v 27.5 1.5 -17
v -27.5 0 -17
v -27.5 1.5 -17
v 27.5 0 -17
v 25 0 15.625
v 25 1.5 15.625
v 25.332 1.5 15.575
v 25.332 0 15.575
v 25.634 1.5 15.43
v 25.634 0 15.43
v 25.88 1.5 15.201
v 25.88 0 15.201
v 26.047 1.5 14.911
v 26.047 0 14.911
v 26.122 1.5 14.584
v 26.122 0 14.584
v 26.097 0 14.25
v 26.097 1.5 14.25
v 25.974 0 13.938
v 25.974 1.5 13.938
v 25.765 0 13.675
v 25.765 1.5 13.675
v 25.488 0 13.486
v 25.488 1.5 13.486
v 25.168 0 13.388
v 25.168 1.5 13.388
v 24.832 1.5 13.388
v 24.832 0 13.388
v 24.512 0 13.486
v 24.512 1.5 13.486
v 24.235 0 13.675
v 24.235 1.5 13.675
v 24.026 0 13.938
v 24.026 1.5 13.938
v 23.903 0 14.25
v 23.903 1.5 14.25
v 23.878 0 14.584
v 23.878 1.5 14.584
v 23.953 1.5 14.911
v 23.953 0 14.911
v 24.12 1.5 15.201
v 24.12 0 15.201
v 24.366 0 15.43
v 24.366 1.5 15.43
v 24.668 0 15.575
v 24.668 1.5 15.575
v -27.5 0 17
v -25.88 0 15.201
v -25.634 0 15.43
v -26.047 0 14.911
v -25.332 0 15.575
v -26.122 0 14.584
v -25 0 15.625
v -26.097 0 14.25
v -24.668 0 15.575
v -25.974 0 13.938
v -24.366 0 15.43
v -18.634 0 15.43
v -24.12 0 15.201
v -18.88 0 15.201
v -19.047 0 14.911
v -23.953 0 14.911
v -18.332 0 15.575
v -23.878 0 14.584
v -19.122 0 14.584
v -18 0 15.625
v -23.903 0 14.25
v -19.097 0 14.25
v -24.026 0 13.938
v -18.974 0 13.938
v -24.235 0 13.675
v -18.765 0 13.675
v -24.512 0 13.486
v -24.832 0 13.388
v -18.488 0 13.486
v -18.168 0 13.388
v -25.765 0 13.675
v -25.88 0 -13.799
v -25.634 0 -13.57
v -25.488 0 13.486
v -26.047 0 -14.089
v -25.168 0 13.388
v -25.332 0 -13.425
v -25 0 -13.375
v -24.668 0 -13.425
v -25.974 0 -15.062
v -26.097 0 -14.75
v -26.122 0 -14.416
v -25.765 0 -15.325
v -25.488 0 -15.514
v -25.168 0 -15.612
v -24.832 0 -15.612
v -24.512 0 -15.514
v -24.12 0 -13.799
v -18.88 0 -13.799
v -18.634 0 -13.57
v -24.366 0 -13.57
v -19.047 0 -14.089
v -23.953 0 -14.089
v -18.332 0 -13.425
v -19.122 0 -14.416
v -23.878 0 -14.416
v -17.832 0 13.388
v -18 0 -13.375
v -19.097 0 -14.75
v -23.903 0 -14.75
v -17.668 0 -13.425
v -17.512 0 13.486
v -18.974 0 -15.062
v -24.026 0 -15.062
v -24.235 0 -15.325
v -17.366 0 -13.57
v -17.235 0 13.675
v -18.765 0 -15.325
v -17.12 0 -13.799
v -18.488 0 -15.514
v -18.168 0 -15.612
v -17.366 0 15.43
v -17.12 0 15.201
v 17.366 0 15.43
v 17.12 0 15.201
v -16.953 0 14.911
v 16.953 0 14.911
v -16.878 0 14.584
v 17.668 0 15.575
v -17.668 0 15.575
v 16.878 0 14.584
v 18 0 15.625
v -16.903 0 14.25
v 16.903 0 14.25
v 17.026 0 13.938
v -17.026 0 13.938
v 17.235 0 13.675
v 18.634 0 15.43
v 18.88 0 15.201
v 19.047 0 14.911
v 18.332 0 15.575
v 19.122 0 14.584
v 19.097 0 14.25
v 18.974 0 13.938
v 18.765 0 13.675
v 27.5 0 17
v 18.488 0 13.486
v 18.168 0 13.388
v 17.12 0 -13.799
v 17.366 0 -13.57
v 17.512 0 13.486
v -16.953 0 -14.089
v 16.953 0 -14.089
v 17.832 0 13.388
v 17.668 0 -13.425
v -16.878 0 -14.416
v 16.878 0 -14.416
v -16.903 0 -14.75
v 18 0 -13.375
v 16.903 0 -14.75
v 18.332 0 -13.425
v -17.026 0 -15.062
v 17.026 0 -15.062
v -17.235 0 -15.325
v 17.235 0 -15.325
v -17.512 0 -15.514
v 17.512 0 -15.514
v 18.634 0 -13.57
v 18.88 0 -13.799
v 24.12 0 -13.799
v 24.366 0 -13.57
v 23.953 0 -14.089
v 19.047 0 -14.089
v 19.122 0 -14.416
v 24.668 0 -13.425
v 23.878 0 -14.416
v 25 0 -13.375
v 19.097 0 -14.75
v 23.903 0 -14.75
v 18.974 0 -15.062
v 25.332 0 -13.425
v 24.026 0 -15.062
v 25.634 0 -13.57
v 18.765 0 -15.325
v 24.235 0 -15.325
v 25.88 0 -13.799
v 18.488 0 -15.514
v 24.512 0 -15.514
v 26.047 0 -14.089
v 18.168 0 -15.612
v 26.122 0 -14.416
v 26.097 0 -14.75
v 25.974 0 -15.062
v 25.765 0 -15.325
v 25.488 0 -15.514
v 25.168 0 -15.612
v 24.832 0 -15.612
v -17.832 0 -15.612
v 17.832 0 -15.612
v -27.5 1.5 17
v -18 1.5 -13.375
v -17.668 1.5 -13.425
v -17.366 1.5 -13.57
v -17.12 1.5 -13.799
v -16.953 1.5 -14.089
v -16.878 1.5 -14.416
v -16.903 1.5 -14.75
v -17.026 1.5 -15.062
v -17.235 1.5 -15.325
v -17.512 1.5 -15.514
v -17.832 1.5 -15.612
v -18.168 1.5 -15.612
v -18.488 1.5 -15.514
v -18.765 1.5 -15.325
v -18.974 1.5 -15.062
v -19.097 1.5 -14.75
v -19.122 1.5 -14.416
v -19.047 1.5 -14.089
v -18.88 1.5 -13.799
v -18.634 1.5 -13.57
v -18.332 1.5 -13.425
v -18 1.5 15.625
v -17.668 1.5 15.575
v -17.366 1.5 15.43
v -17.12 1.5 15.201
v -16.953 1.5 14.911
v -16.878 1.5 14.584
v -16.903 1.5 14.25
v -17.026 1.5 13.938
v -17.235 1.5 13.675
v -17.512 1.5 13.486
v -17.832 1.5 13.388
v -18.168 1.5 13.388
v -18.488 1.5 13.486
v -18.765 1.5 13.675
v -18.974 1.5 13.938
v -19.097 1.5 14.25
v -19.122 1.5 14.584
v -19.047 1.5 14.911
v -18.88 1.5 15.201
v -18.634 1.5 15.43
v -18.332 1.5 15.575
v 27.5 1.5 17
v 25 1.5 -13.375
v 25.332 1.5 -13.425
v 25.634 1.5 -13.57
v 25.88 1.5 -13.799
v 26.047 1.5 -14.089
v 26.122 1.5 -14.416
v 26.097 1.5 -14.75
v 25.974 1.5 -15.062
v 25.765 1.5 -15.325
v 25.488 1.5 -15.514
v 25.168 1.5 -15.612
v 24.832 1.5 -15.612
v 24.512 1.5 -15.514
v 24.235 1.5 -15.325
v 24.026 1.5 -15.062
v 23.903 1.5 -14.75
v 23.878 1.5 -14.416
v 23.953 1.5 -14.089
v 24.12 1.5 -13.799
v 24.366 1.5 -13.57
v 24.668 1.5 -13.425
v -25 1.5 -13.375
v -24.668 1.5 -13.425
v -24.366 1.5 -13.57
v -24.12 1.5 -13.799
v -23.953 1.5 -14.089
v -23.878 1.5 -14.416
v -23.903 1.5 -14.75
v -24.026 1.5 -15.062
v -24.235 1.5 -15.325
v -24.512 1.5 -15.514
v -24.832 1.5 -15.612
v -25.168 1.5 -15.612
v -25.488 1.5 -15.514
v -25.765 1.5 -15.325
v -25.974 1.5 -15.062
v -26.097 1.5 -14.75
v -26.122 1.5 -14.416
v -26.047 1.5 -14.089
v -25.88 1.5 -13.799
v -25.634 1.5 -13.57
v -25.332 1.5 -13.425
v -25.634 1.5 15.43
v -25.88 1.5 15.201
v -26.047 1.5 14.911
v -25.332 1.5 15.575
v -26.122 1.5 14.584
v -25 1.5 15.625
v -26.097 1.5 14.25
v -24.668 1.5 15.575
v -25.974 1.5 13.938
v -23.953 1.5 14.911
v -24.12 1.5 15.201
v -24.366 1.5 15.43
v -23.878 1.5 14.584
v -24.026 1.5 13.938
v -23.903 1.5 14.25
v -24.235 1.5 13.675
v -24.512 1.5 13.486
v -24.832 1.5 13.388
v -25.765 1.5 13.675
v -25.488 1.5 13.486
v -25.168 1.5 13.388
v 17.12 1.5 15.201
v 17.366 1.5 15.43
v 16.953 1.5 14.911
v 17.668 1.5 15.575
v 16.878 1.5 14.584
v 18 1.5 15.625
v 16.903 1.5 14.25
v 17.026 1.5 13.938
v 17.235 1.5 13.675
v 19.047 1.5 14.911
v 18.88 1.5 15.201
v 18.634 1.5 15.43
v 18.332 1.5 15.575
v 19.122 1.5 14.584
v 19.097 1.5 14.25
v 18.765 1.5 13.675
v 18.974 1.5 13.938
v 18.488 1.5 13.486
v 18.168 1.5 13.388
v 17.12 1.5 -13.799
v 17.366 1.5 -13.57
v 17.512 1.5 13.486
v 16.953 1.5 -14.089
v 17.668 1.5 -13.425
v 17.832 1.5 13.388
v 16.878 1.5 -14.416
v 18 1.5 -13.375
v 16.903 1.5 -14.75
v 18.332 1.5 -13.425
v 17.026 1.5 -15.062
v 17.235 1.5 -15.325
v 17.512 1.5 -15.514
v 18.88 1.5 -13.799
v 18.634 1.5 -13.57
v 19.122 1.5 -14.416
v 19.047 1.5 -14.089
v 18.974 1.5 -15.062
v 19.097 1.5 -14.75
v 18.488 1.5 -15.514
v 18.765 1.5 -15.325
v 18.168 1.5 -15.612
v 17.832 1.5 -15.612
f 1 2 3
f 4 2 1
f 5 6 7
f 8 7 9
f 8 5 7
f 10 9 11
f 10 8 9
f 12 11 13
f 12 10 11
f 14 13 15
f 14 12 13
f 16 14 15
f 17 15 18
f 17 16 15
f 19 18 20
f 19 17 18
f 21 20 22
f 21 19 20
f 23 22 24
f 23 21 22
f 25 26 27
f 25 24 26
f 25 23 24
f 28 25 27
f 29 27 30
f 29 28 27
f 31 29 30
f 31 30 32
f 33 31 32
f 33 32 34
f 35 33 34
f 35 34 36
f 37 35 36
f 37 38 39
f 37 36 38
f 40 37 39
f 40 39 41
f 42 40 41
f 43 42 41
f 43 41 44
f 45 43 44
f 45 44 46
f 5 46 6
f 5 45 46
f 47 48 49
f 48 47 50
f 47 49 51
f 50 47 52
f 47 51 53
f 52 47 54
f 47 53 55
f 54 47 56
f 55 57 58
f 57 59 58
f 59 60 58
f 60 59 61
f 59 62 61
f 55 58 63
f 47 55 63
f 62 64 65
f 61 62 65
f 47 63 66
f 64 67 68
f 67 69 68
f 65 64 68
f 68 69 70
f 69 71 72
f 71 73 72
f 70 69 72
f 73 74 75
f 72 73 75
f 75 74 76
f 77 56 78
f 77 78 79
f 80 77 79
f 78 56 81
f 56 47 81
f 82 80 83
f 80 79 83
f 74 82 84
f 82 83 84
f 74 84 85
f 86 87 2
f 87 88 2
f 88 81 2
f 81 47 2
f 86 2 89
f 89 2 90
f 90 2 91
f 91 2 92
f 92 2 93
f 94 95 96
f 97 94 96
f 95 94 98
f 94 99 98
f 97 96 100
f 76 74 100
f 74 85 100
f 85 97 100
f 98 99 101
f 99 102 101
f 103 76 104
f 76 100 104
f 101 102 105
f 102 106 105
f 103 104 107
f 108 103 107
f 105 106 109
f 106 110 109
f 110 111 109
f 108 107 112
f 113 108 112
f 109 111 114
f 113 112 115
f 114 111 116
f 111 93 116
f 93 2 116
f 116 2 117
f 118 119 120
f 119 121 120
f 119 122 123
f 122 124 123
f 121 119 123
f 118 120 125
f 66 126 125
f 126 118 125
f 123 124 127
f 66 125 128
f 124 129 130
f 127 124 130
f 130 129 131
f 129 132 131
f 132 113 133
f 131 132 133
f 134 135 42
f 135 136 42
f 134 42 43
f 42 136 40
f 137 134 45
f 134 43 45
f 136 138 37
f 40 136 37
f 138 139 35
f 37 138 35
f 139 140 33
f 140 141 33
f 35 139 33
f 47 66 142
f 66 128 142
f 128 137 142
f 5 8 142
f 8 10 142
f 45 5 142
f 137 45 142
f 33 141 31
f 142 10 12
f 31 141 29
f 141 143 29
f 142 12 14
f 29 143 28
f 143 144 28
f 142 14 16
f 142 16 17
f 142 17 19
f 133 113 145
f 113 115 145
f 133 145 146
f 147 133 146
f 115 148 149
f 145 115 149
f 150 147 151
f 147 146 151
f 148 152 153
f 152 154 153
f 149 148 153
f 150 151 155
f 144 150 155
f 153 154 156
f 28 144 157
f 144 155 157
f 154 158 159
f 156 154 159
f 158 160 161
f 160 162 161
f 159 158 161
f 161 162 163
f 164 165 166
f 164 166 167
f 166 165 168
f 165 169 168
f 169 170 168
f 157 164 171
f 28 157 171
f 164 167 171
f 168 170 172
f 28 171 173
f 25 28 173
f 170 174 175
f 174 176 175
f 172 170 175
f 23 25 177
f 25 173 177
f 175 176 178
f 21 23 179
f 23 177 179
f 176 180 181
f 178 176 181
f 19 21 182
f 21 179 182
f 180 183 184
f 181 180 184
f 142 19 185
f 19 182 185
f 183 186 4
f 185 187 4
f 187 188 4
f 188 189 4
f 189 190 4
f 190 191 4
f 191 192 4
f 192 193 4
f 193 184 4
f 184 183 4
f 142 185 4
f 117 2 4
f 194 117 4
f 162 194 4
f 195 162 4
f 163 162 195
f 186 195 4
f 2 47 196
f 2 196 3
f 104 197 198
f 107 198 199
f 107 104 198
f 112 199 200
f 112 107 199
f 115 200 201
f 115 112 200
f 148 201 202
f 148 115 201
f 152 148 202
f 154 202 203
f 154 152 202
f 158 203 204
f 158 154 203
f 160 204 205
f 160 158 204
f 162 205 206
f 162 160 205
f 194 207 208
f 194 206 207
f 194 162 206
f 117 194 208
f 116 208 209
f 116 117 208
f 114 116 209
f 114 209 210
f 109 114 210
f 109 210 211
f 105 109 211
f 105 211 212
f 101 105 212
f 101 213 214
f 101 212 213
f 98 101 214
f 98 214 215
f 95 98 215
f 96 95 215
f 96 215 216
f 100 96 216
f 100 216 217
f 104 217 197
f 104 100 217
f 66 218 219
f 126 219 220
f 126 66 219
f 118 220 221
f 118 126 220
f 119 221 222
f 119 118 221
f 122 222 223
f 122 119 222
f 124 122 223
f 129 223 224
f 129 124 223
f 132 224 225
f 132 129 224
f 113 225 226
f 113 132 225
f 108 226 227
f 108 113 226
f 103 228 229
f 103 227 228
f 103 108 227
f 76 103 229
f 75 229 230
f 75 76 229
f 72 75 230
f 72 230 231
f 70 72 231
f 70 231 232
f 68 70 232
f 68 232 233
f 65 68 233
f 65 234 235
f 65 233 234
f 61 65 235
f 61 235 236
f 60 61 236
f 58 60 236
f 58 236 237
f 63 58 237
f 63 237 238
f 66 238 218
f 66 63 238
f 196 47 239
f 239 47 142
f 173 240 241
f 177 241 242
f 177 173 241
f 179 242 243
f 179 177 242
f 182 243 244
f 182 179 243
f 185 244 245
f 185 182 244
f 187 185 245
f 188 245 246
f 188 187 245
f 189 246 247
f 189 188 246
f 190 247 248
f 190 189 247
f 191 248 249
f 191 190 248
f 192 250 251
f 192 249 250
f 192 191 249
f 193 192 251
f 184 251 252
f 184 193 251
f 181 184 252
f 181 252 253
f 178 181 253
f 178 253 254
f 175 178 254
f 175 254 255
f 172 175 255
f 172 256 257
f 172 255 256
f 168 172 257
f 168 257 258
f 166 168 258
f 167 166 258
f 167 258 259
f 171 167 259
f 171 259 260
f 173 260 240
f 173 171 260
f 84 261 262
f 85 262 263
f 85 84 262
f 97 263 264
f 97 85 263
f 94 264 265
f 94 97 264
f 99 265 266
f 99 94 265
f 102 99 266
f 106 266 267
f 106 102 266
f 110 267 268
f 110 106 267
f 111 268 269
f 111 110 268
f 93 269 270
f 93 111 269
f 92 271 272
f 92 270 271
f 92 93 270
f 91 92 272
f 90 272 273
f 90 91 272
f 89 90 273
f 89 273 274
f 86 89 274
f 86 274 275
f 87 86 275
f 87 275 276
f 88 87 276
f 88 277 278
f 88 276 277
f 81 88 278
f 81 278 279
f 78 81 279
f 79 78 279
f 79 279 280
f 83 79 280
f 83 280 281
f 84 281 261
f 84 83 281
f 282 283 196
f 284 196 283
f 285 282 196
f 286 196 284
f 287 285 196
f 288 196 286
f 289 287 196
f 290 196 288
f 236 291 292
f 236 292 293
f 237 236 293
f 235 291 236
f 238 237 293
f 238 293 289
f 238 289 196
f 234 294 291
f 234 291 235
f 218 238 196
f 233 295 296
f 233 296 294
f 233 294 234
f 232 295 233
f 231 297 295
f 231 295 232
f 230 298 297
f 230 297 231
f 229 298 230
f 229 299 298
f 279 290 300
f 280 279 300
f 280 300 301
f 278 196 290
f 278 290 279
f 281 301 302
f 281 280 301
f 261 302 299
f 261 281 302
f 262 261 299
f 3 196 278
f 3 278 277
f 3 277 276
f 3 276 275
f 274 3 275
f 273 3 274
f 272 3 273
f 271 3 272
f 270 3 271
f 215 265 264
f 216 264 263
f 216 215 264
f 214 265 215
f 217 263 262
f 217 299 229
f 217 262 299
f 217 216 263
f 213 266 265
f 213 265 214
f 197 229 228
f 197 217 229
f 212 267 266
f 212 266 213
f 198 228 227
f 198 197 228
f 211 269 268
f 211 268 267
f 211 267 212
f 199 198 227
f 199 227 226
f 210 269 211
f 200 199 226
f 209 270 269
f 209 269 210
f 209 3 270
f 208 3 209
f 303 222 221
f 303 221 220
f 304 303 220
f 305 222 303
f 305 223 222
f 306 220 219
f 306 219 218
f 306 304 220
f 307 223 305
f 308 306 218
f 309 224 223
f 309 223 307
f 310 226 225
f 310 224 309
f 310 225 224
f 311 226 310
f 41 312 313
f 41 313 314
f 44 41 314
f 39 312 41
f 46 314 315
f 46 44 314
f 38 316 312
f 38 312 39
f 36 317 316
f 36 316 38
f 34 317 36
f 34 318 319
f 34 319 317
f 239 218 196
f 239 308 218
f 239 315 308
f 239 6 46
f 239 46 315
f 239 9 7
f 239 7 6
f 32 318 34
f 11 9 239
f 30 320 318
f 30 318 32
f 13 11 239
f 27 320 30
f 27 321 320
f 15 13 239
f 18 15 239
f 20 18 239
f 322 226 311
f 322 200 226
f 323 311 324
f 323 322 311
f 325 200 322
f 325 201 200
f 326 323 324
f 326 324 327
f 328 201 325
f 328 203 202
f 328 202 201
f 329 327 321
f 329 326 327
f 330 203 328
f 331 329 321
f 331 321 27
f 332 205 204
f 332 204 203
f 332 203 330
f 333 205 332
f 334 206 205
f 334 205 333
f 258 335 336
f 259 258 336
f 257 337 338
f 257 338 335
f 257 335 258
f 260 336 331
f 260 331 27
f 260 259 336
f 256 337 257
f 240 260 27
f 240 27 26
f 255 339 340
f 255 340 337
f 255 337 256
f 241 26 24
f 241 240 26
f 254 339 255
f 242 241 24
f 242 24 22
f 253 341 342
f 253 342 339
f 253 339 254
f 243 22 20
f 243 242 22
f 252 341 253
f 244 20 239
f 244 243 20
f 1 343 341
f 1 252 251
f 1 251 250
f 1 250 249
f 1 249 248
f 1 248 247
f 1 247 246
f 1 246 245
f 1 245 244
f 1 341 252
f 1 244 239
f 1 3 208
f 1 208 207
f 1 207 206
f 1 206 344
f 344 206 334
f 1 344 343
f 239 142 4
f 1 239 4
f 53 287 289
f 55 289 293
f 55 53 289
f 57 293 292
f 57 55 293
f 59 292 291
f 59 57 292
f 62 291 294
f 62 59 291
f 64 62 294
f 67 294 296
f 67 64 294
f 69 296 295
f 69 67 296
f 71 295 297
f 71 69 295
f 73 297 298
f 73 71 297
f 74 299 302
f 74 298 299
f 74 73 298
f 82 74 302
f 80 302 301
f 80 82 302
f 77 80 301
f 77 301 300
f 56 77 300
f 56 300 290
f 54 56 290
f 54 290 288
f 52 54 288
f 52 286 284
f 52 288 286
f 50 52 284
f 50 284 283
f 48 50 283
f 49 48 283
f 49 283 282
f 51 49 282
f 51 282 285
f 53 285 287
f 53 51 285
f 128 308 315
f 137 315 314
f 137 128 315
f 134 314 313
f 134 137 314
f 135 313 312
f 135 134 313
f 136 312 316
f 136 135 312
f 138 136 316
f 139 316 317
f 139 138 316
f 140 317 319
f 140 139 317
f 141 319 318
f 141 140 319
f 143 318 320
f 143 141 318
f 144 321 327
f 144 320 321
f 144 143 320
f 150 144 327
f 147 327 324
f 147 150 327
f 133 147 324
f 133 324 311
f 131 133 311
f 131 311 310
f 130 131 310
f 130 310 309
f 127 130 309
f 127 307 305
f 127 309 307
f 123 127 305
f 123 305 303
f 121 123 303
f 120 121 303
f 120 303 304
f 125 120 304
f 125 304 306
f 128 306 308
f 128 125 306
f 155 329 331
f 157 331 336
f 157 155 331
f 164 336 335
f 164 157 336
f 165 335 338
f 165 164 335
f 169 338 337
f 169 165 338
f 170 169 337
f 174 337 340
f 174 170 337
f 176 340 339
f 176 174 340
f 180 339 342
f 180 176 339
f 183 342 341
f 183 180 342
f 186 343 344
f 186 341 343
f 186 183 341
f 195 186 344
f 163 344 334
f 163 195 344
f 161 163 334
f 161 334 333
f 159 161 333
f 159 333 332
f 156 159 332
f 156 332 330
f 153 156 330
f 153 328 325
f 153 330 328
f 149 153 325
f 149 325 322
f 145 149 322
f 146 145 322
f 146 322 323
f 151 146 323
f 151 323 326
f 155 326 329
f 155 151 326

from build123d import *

# Parameters (mm, degrees)
SKETCH1_W           = 55
SKETCH1_H           = 34
BOSS_EXTRUDE1_DEPTH = 1.5
SKETCH3_R           = 1.125
CUT_EXTRUDE5_DEPTH  = 33.365104665


with BuildPart() as part:
    # Sketch1 → Boss-Extrude1 (new body)
    with BuildSketch(Plane(origin=(0, 0, 0), x_dir=(1, 0, 0), z_dir=(0, 1, 0))):
        Rectangle(SKETCH1_W, SKETCH1_H)
    extrude(amount=BOSS_EXTRUDE1_DEPTH)

    # Sketch3 → Cut-Extrude5 (cut, through all)
    with BuildSketch(Plane(origin=(0, 0, 0), x_dir=(1, 0, 0), z_dir=(0, 1, 0))):
        with Locations(Location((-18, 14.5, 0), (0, 0, 270))):
            Circle(SKETCH3_R)
        with Locations(Location((18, 14.5, 0), (0, 0, 270))):
            Circle(SKETCH3_R)
        with Locations(Location((-18, -14.5, 0), (0, 0, 270))):
            Circle(SKETCH3_R)
        with Locations(Location((18, -14.5, 0), (0, 0, 270))):
            Circle(SKETCH3_R)
        with Locations(Location((-25, 14.5, 0), (0, 0, 270))):
            Circle(SKETCH3_R)
        with Locations(Location((25, 14.5, 0), (0, 0, 270))):
            Circle(SKETCH3_R)
        with Locations(Location((25, -14.5, 0), (0, 0, 270))):
            Circle(SKETCH3_R)
        with Locations(Location((-25, -14.5, 0), (0, 0, 270))):
            Circle(SKETCH3_R)
    extrude(amount=CUT_EXTRUDE5_DEPTH, mode=Mode.SUBTRACT)


solid = part.part
